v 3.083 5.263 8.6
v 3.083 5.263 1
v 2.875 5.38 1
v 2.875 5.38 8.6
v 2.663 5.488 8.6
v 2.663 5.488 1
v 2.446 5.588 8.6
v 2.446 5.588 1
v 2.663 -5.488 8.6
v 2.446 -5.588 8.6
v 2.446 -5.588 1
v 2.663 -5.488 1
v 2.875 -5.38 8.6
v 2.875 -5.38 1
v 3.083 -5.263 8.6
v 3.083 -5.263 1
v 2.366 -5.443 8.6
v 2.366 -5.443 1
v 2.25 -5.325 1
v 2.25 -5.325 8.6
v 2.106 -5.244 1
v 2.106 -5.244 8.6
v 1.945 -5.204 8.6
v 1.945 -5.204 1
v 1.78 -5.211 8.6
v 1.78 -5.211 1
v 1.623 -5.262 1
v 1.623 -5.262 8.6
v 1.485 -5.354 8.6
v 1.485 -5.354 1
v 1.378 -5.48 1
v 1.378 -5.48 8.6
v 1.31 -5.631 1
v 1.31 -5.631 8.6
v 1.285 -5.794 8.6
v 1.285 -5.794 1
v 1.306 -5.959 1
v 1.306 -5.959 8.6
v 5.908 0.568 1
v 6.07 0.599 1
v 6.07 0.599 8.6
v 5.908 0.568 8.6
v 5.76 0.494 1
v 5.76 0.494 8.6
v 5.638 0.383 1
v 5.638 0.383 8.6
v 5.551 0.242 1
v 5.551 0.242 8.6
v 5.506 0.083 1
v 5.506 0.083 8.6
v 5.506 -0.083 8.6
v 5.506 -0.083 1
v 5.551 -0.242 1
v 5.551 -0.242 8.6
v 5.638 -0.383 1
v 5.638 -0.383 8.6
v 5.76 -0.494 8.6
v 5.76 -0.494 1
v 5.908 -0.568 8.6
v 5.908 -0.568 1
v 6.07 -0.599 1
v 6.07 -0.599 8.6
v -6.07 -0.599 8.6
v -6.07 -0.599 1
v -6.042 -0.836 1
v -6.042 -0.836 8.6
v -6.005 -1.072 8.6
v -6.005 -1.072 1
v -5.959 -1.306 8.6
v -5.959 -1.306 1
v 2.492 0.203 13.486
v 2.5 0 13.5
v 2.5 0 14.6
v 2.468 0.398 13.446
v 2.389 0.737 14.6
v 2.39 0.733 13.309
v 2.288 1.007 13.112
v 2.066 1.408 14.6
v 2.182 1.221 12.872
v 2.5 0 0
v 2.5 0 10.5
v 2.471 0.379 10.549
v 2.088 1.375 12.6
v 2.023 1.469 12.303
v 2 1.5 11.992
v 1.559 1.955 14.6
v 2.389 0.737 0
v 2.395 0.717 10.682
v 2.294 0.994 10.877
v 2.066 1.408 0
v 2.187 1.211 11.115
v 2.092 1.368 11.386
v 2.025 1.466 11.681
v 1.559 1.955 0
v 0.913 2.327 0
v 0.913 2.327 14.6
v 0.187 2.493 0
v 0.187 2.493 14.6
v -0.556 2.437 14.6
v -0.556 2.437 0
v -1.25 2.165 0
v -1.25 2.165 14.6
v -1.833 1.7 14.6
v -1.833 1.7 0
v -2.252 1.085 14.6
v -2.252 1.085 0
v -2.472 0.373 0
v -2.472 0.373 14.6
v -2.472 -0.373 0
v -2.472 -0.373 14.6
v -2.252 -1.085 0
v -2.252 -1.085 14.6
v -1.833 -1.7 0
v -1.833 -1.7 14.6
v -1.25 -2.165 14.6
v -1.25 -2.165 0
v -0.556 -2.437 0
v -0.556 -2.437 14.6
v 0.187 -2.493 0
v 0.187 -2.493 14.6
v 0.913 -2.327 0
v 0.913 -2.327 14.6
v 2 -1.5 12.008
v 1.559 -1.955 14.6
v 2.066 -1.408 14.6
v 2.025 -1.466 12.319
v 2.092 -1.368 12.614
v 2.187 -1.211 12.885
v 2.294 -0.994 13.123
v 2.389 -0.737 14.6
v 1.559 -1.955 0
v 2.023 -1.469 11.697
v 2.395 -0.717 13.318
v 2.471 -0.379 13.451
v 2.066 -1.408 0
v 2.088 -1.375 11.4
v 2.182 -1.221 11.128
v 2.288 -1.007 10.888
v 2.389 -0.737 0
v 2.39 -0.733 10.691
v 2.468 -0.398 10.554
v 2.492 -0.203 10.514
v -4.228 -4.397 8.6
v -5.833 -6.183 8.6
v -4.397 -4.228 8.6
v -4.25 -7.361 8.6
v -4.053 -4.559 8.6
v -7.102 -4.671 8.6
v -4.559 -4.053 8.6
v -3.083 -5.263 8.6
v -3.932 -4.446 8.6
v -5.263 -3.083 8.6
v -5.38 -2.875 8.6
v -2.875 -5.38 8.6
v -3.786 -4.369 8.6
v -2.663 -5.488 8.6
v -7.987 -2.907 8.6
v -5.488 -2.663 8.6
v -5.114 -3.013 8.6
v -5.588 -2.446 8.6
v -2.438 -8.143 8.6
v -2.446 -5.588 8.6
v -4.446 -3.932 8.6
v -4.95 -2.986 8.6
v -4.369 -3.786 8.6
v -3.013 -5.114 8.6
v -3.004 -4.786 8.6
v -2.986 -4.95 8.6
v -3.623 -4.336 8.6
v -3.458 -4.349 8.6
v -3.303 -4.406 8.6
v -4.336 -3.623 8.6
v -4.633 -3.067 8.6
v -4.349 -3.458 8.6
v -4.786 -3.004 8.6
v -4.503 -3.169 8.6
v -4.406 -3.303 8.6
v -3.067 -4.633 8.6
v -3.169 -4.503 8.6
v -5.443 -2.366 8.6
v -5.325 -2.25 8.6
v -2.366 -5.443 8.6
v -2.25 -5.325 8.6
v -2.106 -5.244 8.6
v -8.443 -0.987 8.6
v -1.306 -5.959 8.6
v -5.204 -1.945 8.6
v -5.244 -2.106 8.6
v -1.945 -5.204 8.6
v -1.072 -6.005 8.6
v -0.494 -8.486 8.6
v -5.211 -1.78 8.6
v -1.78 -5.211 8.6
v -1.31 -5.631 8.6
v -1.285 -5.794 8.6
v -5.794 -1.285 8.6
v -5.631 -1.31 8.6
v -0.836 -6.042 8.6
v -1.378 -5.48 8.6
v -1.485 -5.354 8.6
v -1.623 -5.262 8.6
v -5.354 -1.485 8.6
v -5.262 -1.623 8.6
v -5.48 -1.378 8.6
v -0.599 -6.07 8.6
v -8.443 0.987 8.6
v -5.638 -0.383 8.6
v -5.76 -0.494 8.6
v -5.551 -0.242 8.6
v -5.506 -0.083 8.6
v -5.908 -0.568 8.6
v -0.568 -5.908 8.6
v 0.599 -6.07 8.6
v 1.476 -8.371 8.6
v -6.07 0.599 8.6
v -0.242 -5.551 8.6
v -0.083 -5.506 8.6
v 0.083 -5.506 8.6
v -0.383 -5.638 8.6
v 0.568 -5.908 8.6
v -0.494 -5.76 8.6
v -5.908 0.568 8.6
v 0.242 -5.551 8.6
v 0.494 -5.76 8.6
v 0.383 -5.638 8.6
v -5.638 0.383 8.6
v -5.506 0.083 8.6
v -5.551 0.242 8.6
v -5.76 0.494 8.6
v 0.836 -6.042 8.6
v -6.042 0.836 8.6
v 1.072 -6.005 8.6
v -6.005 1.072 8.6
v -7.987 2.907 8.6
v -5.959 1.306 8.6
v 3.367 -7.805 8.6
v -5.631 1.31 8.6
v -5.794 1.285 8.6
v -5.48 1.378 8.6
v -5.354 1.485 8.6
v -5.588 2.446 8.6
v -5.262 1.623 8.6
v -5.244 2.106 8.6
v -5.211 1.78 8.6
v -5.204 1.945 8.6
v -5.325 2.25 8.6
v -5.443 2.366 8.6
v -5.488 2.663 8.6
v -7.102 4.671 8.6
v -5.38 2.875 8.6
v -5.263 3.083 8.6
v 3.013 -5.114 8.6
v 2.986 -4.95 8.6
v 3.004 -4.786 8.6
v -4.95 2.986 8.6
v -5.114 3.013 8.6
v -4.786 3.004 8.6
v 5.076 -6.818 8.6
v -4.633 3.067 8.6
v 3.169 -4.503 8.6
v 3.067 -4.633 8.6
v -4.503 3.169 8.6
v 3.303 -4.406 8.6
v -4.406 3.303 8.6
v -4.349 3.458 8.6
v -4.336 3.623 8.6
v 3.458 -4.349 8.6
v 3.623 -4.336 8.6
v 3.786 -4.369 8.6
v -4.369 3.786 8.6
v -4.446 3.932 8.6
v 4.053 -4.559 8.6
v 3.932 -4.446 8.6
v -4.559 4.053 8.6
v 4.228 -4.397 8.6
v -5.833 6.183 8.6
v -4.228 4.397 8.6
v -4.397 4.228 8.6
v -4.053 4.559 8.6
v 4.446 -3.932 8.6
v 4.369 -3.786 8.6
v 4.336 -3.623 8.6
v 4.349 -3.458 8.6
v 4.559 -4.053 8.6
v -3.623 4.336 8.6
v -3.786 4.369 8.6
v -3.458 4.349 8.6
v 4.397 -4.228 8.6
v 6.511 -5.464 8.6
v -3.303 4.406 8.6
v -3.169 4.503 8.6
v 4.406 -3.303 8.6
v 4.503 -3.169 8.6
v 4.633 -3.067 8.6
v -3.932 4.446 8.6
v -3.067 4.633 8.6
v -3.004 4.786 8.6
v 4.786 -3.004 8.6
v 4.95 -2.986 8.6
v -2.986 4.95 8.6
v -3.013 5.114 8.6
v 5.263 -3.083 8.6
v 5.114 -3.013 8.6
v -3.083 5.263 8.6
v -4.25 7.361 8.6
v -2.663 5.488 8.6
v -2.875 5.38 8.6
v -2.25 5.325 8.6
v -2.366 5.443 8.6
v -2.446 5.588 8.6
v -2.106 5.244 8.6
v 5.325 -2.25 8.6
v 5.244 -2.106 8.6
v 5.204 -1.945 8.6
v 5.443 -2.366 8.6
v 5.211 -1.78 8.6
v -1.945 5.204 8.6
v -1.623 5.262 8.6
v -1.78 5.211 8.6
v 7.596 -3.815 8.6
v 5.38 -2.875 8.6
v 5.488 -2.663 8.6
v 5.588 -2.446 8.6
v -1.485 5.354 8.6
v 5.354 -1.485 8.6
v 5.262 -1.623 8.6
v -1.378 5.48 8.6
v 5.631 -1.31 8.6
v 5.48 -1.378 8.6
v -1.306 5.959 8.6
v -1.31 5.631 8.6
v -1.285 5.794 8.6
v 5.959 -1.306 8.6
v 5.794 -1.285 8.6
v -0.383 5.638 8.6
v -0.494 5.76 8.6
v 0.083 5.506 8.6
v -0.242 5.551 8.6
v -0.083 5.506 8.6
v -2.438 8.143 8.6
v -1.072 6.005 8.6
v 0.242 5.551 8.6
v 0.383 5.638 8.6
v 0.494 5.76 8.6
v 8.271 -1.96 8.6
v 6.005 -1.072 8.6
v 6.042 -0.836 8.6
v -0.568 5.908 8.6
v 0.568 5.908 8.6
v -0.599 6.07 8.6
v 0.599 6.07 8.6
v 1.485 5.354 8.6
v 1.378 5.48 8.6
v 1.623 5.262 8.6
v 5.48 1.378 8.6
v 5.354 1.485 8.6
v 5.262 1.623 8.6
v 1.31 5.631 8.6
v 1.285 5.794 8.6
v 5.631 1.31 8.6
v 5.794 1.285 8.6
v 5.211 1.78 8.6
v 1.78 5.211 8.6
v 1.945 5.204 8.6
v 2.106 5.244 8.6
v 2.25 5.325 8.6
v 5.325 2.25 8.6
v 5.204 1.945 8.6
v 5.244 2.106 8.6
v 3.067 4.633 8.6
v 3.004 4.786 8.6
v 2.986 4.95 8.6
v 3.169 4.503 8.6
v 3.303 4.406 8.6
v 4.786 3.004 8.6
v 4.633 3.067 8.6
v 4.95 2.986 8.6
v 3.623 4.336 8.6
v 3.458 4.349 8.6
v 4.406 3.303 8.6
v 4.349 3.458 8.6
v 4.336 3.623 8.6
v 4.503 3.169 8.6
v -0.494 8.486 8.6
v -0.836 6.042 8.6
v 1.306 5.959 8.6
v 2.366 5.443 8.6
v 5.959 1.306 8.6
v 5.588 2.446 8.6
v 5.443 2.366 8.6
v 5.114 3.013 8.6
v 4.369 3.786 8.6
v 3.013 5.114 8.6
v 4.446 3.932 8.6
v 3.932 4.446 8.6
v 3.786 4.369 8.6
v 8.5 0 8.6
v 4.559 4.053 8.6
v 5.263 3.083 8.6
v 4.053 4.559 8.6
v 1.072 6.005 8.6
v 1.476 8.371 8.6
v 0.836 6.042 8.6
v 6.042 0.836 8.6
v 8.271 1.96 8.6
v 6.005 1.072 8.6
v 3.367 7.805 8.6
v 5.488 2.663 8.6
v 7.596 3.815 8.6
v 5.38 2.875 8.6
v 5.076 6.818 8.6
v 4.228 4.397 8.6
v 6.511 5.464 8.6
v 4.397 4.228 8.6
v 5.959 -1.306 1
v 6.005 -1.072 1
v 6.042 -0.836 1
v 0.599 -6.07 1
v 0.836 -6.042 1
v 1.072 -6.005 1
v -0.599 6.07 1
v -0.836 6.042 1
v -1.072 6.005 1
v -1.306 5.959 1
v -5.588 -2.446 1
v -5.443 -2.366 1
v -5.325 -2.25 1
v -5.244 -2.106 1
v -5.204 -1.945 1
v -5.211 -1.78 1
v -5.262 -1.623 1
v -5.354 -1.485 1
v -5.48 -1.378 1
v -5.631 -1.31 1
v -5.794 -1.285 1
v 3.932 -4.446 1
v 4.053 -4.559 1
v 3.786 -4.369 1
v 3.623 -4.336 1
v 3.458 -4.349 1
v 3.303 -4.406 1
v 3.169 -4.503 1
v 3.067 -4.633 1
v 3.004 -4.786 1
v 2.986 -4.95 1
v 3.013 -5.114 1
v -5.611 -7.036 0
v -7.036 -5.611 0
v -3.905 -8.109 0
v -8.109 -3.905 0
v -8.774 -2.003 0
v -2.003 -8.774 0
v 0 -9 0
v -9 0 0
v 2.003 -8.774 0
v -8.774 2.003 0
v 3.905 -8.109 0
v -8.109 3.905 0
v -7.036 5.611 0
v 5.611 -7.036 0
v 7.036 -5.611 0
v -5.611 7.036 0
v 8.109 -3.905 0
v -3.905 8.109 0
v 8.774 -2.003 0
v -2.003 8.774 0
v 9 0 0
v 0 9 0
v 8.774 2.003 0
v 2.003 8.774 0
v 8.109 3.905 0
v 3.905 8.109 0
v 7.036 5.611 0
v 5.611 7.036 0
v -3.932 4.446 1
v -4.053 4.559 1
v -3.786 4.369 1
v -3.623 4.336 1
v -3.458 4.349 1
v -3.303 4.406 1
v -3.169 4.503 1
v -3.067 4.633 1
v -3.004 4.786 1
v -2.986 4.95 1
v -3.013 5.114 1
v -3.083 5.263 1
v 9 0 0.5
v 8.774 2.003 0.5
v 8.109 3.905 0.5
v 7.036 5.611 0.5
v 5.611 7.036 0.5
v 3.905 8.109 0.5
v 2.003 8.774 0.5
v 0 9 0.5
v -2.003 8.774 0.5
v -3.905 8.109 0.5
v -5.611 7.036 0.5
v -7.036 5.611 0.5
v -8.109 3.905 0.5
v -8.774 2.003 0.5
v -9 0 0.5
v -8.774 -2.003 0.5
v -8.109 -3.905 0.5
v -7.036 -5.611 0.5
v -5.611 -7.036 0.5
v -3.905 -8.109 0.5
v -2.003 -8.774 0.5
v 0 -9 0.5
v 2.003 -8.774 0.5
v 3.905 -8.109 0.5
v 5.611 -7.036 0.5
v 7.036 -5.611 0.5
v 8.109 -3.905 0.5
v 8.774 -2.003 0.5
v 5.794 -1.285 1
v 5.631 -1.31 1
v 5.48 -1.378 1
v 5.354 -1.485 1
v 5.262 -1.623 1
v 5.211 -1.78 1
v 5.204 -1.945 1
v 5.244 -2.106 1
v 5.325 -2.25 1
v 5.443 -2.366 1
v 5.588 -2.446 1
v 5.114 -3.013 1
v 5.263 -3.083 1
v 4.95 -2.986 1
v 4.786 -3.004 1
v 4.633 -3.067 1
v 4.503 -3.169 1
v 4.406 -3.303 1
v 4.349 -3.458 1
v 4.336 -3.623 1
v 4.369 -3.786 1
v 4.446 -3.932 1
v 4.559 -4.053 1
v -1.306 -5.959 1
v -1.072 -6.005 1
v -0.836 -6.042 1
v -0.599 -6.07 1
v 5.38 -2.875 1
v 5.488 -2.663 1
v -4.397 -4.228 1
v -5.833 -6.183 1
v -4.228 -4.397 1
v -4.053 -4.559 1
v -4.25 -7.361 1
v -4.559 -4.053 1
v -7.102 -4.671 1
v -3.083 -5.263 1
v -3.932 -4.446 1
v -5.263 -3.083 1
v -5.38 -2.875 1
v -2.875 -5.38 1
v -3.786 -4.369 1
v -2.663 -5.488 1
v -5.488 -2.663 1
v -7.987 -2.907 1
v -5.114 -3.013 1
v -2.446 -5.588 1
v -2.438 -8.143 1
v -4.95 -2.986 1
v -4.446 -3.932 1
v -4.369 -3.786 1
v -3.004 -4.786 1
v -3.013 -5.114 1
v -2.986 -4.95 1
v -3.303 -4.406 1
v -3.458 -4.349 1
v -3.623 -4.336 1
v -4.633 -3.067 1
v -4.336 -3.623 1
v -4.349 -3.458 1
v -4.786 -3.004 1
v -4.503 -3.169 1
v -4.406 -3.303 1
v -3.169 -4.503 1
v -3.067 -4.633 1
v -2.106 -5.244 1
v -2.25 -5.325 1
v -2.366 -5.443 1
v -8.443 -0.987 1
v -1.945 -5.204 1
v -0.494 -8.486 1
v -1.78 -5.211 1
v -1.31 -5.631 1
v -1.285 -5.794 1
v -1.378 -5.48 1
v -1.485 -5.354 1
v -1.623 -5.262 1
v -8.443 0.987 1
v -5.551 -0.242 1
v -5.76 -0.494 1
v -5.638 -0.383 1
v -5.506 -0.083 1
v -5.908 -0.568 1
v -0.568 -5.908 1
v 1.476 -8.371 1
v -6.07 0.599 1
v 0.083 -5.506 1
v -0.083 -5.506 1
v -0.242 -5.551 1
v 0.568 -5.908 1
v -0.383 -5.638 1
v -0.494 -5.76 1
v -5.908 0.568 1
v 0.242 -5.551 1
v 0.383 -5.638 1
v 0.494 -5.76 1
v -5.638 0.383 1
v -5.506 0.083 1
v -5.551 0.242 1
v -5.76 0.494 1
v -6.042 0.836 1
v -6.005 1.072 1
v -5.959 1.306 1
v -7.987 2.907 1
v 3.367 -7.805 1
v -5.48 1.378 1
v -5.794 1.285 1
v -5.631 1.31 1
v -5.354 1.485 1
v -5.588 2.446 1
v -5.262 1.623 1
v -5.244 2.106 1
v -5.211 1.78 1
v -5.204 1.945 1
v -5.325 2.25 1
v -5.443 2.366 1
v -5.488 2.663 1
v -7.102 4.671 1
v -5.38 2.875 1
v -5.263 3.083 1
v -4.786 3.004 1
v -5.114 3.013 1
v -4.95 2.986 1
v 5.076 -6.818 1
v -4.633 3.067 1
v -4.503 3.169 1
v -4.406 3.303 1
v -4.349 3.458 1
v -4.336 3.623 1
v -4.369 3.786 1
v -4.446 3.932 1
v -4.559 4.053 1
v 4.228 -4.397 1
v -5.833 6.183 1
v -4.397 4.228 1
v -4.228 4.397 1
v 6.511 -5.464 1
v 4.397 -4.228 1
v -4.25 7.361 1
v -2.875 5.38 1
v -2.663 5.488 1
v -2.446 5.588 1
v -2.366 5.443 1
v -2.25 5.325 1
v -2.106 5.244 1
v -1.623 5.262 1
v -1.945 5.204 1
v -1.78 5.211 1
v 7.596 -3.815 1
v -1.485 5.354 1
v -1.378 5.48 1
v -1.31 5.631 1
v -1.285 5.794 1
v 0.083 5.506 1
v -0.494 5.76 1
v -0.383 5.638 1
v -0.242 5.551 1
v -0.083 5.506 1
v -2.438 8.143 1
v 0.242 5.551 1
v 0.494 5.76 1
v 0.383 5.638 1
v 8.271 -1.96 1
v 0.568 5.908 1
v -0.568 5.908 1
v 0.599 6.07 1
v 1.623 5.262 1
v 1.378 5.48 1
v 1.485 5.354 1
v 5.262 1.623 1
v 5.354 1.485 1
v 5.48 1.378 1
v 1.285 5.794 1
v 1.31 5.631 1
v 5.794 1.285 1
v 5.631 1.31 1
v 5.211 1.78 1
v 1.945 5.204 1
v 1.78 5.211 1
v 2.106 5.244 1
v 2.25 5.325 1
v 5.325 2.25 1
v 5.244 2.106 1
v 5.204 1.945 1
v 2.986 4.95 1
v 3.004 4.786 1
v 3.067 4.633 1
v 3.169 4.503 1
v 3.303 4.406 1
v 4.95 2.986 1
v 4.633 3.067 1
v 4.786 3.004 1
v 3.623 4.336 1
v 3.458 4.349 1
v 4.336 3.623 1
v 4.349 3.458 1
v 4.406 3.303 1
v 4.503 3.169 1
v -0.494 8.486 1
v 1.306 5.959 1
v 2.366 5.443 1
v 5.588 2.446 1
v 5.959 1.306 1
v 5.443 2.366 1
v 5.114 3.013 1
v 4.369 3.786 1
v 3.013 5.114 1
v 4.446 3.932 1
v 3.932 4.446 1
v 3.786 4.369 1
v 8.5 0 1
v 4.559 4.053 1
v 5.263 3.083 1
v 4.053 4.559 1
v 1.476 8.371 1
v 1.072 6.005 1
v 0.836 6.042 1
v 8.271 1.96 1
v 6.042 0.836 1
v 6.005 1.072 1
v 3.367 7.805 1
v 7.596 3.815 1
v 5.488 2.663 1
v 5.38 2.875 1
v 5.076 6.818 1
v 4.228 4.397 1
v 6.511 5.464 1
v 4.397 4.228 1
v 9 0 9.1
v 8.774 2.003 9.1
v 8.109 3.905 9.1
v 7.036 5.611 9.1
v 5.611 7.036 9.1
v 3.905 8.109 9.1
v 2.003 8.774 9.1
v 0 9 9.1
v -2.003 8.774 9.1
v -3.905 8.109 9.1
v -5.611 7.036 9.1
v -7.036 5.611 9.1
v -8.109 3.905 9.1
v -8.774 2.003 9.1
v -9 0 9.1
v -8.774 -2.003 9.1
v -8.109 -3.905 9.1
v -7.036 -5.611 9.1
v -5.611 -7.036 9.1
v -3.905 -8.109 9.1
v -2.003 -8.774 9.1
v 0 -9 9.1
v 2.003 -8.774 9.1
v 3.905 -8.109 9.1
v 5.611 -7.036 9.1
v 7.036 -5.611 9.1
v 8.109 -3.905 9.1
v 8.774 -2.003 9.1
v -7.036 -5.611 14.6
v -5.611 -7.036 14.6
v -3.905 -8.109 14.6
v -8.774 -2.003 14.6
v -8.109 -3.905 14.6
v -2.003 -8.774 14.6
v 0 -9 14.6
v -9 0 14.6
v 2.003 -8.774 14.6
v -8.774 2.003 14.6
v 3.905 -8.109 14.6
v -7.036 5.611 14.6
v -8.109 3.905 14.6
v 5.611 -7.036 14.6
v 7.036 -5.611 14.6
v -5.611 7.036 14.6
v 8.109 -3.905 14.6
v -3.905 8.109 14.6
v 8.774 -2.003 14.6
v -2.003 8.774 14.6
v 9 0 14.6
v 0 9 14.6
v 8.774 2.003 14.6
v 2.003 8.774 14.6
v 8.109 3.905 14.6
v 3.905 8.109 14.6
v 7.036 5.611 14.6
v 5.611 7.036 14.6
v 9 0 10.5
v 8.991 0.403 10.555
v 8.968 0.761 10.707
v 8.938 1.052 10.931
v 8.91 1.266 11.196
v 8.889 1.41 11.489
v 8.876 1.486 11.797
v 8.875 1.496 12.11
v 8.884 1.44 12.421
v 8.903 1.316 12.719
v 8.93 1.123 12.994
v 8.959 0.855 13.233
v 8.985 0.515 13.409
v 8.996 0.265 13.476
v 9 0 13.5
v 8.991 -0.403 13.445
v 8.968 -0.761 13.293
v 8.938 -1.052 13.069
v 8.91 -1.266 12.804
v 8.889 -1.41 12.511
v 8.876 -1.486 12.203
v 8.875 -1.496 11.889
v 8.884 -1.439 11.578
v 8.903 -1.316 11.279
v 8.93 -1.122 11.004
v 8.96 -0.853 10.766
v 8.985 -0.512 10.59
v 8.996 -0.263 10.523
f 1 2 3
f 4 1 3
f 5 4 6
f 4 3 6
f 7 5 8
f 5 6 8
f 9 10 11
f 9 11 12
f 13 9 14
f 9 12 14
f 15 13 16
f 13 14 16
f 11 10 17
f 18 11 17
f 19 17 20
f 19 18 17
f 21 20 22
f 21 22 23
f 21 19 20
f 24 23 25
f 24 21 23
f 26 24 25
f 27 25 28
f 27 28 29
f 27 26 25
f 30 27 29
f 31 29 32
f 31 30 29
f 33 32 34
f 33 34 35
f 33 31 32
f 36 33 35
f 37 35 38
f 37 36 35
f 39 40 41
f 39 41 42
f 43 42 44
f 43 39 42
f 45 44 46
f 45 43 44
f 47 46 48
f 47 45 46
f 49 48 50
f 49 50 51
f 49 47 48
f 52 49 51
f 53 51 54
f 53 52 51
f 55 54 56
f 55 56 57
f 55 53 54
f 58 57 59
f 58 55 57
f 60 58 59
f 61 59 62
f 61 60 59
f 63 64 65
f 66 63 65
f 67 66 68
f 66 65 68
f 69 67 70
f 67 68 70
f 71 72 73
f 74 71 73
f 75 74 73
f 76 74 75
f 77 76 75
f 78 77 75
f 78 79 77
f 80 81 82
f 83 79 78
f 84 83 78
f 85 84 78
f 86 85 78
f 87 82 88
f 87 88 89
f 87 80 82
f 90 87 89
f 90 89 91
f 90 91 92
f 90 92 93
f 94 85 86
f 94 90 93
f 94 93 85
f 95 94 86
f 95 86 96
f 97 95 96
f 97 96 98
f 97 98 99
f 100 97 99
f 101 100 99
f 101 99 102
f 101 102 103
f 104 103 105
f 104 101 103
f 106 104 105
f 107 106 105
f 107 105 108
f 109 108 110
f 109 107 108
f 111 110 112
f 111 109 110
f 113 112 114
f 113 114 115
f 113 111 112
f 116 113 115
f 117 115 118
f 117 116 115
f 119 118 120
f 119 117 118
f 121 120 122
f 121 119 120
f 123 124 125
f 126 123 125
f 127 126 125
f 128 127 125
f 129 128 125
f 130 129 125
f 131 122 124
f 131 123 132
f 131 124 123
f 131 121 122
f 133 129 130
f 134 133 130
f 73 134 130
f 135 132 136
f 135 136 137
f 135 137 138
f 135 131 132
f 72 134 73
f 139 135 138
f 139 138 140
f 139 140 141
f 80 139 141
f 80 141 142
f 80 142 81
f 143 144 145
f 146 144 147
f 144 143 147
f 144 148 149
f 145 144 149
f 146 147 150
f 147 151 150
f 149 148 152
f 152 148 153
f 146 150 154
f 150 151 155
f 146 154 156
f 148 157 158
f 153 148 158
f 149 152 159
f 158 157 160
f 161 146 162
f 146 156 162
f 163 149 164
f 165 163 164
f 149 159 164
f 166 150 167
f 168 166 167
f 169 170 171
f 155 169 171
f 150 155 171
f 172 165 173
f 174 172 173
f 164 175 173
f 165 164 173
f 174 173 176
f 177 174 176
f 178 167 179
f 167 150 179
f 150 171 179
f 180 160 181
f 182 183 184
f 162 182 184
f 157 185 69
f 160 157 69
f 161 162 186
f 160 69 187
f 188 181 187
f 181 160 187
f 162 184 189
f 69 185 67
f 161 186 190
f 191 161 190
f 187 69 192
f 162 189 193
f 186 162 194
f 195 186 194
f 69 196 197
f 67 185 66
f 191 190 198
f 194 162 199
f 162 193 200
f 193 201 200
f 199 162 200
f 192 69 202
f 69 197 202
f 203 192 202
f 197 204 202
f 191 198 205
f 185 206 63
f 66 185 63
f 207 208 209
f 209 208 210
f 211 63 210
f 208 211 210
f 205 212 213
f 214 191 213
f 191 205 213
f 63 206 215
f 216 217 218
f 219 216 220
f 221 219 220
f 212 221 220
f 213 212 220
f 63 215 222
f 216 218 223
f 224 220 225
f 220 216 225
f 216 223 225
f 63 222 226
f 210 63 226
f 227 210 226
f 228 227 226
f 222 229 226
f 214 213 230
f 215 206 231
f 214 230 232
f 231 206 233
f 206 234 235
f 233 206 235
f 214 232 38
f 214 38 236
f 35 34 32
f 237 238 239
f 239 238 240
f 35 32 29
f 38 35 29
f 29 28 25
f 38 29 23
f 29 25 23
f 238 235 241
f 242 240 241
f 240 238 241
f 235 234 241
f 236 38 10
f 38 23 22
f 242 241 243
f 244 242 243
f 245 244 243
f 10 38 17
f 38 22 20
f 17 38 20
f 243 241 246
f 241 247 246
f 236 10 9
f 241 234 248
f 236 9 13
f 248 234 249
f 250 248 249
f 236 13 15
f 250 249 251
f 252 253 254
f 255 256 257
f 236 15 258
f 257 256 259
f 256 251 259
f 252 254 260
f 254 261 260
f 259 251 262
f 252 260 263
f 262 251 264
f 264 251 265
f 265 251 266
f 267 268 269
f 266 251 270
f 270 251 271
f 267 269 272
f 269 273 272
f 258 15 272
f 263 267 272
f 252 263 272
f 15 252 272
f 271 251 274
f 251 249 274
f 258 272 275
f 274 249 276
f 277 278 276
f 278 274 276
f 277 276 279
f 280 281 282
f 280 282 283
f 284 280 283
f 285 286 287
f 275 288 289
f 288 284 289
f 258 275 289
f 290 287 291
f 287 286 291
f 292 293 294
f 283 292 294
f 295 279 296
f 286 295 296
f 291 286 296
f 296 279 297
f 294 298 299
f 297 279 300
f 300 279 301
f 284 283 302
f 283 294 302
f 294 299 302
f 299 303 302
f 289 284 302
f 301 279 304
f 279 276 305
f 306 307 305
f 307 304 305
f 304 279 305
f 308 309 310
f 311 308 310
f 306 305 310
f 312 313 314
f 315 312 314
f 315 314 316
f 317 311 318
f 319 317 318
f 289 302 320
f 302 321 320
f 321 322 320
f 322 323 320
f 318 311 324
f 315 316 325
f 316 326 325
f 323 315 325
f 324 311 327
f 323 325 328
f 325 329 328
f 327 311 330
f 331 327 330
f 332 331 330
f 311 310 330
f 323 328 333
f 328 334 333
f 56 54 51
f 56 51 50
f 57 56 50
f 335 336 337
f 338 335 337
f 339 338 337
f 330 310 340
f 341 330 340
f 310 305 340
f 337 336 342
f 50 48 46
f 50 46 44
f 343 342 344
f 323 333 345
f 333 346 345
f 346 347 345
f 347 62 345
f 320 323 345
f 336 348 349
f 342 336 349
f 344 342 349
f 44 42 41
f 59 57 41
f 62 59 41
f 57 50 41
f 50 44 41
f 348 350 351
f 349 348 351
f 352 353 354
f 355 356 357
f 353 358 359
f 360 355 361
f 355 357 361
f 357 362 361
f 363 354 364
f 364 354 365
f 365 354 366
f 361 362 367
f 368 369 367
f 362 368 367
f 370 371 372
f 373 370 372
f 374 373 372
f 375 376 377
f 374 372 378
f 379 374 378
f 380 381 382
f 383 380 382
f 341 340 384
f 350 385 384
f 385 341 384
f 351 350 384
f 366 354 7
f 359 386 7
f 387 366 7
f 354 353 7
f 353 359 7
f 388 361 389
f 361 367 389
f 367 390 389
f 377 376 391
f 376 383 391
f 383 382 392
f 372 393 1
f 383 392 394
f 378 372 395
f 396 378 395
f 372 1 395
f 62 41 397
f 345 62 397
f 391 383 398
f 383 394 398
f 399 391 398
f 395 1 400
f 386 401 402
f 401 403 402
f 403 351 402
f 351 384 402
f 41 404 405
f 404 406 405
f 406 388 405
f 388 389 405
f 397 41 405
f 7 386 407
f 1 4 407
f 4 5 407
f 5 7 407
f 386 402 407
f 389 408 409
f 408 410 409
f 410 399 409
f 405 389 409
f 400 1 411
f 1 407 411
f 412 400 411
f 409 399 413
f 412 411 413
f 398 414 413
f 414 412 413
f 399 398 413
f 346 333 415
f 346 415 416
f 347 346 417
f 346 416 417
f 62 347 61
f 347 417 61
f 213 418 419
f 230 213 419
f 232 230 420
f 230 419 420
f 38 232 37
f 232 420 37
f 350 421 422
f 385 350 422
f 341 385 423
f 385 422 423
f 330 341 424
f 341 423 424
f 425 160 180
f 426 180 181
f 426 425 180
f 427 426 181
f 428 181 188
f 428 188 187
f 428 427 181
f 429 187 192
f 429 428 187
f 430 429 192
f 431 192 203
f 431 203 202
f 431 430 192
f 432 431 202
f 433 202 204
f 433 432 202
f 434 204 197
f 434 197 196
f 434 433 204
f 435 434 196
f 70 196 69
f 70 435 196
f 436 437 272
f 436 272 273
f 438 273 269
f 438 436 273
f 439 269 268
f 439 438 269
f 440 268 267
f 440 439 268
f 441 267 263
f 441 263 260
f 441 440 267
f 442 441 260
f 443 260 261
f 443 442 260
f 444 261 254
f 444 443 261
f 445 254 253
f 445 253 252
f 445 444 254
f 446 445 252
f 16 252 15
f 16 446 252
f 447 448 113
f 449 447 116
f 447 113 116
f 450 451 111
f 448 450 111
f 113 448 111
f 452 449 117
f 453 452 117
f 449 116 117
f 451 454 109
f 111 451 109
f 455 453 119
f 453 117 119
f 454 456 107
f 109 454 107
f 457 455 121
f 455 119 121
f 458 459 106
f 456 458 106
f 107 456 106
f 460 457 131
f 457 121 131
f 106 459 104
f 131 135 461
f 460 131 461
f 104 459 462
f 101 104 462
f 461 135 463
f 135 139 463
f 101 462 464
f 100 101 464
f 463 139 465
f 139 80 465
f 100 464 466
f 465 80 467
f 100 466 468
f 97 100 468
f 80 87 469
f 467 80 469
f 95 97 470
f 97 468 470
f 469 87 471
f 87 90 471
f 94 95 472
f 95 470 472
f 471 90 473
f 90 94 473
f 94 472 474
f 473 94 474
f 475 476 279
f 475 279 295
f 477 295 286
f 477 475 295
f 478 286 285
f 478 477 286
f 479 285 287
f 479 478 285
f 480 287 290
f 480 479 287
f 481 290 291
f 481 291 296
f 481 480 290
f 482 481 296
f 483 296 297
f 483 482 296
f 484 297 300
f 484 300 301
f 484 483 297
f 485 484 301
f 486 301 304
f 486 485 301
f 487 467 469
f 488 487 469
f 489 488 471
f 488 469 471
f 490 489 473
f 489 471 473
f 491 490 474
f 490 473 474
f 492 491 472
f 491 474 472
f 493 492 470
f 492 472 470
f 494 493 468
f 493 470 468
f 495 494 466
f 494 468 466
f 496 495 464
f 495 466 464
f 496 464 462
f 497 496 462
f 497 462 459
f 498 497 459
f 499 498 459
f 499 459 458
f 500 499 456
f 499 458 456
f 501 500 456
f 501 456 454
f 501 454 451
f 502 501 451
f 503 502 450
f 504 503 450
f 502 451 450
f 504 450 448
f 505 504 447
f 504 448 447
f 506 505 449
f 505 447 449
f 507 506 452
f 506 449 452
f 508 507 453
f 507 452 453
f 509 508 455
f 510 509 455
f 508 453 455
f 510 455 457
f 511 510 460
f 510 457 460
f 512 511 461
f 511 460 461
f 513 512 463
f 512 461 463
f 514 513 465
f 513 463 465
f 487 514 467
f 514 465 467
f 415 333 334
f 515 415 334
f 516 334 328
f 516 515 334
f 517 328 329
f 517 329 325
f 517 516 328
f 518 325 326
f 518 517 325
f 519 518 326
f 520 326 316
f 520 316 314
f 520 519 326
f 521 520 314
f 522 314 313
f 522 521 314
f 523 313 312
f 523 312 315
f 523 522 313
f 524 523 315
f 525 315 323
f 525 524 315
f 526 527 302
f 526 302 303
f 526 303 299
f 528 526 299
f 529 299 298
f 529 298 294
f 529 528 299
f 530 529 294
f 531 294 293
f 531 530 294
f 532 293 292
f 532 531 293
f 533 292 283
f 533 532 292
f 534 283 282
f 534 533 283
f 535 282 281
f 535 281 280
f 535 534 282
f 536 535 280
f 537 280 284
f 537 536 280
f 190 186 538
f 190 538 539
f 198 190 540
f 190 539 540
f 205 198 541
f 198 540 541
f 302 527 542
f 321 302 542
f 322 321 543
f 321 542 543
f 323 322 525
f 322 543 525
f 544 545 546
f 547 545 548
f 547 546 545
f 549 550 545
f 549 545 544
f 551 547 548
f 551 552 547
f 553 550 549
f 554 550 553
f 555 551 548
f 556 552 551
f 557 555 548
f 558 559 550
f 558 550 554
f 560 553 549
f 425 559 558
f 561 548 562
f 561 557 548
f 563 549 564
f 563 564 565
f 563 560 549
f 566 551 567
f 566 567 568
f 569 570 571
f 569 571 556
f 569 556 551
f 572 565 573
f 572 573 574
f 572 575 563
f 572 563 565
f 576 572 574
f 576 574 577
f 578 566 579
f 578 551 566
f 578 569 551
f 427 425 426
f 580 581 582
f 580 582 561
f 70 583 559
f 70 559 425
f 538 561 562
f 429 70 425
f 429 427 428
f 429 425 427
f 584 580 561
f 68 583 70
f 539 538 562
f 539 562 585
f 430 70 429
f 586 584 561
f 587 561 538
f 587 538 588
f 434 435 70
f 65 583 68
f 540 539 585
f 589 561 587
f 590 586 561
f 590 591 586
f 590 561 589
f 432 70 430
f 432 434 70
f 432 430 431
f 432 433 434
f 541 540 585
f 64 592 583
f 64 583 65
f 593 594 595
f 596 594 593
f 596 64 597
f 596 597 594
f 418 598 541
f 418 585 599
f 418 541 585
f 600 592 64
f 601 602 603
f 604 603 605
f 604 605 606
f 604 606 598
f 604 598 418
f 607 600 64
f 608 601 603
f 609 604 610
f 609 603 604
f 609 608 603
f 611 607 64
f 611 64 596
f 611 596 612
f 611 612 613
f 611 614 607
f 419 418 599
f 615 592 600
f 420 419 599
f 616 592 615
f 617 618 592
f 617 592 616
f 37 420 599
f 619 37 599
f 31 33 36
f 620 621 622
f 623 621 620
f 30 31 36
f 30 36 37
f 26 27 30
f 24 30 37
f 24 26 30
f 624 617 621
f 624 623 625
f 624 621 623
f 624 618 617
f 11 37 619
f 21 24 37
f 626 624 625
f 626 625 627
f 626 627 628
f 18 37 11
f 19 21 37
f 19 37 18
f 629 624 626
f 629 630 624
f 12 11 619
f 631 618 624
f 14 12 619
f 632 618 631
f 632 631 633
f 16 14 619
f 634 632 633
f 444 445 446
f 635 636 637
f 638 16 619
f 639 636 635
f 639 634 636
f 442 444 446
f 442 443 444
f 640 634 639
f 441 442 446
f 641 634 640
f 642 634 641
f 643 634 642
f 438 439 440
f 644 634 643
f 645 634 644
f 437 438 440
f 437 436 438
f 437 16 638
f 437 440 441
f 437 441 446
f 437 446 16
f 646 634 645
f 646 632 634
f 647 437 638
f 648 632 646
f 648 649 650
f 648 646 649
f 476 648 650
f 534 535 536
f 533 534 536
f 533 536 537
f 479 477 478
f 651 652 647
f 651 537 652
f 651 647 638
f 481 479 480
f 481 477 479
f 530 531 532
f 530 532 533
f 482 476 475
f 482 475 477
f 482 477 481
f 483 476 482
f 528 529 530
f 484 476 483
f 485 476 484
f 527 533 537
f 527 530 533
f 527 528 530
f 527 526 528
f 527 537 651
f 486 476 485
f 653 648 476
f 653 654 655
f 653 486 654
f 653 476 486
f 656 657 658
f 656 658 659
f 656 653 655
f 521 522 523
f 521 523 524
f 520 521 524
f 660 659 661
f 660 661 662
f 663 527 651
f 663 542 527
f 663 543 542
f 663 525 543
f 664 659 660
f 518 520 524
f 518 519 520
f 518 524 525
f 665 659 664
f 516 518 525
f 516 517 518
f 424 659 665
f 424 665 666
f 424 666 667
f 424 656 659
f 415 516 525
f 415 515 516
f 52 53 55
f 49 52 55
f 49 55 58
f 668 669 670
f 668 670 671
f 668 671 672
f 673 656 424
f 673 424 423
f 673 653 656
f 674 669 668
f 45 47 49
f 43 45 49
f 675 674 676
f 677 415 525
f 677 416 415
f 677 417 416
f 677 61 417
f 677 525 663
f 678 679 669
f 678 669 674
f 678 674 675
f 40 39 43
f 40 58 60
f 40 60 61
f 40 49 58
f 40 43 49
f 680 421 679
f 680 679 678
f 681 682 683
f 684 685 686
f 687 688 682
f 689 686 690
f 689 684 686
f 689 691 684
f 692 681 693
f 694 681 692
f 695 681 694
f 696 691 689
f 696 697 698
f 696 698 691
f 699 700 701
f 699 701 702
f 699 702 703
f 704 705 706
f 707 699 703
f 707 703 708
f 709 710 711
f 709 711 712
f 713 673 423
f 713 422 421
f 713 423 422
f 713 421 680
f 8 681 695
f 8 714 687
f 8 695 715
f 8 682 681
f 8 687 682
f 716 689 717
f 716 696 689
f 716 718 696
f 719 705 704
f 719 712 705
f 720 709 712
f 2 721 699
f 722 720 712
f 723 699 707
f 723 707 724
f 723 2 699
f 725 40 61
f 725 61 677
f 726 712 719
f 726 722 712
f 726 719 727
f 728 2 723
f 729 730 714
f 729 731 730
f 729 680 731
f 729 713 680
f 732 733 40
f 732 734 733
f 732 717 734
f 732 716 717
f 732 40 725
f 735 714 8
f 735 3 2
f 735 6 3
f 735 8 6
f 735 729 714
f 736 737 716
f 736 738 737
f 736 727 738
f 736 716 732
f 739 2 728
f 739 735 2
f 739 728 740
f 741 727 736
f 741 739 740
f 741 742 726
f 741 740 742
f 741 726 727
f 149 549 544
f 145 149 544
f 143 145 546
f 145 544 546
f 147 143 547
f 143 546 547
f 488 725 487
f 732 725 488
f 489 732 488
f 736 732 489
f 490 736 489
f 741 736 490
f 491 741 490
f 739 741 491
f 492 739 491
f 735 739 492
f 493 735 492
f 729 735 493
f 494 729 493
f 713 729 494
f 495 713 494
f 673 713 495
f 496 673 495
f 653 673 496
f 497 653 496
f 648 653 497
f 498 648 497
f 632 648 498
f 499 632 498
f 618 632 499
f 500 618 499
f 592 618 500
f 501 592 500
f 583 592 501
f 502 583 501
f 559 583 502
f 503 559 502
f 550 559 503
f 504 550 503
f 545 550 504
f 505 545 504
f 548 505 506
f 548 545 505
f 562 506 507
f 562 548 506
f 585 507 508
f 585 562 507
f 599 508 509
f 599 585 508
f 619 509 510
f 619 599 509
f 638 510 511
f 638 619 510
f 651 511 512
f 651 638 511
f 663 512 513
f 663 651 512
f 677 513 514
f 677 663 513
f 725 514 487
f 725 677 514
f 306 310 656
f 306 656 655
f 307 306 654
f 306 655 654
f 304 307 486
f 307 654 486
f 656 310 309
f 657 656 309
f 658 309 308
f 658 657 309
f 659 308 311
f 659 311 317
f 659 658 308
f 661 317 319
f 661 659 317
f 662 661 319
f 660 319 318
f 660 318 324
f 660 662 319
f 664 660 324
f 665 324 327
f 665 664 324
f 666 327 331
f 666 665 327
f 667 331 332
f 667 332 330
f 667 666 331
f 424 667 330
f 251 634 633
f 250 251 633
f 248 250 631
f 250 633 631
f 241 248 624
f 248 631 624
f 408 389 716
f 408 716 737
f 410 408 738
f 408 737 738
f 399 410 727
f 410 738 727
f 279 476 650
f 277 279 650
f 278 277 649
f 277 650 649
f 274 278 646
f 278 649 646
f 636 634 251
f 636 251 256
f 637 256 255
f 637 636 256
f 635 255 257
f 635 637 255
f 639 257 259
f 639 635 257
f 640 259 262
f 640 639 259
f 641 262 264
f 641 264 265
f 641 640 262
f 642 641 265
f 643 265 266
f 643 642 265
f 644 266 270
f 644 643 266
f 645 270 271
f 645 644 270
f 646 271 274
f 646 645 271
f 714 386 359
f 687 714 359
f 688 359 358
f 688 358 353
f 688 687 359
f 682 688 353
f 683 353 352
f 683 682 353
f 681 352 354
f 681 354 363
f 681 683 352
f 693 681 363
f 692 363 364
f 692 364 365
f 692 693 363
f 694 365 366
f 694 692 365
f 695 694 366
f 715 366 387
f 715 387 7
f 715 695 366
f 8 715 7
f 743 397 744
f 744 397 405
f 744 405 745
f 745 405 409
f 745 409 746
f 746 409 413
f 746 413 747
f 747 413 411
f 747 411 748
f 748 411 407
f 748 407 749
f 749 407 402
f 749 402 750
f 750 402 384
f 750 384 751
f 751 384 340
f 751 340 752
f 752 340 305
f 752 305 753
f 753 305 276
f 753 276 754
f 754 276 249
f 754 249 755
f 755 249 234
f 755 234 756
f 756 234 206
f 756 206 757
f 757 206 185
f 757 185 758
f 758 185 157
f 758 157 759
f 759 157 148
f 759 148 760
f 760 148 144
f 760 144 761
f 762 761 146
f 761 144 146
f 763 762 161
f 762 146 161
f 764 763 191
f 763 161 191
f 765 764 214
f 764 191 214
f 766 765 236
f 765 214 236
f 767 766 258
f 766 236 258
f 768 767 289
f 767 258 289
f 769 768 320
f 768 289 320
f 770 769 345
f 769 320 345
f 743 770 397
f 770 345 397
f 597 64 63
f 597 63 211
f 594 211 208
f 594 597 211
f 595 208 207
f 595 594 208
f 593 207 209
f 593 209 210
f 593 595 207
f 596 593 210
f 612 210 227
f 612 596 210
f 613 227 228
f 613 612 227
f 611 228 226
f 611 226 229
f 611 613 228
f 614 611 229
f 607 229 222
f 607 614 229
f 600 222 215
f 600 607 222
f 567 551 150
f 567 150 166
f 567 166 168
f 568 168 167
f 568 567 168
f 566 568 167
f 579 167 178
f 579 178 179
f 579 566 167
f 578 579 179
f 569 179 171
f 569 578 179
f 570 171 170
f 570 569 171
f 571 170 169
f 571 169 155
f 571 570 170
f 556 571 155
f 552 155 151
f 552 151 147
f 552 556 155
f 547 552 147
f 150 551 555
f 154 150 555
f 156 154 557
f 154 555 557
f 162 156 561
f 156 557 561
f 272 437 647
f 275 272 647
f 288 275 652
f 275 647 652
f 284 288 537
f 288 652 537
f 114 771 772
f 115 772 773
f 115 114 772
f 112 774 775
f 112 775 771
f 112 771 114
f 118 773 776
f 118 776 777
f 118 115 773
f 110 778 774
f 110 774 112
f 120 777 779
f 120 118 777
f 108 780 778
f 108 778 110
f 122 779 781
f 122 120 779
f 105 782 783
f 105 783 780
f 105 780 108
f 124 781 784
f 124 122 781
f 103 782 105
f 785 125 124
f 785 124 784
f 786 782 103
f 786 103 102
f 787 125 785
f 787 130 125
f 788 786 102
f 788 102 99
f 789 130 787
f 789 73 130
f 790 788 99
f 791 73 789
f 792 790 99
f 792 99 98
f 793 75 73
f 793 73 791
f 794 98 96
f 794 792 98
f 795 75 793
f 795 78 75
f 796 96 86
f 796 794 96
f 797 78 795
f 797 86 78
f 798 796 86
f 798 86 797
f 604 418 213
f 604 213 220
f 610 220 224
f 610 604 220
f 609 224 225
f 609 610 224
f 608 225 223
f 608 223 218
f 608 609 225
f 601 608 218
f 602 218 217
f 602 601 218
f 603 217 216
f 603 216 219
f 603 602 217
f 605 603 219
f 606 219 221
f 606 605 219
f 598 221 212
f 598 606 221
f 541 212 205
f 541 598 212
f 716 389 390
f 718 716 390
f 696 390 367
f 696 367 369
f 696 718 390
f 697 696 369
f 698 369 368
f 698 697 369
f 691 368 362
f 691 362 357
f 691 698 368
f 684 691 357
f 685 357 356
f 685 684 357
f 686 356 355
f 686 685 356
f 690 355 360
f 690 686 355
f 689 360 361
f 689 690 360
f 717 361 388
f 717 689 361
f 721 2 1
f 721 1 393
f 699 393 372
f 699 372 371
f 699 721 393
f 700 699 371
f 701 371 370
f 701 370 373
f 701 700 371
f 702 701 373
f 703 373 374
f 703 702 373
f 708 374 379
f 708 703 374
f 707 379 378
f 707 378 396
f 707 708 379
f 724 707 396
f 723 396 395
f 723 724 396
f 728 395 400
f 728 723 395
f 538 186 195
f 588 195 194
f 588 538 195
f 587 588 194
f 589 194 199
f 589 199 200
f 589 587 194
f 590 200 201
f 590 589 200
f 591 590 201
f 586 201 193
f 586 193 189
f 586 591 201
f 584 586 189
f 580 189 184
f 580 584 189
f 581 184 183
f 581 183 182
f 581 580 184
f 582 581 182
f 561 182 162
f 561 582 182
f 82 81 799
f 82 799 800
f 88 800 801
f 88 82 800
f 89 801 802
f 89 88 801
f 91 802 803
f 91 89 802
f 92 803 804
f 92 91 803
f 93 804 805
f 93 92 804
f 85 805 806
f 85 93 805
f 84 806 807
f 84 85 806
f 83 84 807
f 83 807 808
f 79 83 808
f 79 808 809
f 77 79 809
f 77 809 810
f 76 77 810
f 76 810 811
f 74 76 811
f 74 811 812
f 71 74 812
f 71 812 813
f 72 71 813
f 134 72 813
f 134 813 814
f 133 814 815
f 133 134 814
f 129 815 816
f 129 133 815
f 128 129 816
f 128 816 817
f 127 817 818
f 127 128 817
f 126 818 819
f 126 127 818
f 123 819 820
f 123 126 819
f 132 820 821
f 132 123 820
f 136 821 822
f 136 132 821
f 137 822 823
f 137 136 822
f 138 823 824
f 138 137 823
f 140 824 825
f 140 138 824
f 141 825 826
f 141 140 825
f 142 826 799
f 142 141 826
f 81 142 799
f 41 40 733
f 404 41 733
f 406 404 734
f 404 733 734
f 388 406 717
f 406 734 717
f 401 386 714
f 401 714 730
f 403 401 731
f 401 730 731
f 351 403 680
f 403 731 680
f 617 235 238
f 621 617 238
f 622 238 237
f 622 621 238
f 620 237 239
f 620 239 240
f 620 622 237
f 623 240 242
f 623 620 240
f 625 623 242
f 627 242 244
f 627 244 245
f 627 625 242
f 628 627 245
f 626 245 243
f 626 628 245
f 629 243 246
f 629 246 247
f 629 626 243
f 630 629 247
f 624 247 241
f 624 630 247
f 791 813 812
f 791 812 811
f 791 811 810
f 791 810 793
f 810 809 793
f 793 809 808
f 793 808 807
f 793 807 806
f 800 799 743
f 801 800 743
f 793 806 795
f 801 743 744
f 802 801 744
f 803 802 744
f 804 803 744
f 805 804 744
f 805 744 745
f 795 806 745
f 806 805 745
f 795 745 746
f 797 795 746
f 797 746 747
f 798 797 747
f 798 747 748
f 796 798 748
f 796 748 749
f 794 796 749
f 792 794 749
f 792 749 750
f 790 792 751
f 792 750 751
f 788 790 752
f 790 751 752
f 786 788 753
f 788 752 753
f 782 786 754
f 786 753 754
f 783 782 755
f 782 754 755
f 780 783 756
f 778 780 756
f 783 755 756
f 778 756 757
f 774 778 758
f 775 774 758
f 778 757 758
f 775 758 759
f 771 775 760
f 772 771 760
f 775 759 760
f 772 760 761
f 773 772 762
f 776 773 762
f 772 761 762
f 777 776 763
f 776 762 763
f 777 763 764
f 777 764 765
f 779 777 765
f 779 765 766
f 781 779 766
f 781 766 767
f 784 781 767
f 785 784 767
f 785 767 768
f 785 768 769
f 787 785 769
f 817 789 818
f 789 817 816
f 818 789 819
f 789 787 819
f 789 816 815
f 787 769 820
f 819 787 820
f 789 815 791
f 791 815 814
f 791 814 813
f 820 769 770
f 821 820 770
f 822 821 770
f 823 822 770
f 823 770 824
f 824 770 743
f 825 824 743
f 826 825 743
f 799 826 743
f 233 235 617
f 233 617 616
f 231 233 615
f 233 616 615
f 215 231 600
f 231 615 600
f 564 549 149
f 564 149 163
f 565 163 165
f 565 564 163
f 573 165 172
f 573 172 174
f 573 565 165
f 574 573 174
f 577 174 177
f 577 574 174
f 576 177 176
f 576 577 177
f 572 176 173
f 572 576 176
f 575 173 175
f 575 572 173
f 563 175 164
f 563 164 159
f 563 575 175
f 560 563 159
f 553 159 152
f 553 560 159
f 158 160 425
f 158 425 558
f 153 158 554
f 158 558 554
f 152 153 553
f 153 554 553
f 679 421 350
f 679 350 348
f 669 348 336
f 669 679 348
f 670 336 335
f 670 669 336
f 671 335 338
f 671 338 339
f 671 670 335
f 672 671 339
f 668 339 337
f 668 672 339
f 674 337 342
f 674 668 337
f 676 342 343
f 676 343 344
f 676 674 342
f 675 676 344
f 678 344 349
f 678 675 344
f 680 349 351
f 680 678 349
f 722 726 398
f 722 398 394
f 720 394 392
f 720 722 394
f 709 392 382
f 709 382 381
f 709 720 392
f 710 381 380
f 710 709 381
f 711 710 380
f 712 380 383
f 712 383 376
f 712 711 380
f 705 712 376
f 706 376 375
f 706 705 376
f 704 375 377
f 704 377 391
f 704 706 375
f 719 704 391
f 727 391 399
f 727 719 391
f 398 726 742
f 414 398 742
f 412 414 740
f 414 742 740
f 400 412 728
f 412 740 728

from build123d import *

# Parameters (mm, degrees)
CYLINDER014_R           = 1.5
CYLINDER014_DEPTH       = 9
CYLINDER014_PITCH_ANGLE = 90
CYLINDER013_R           = 2.5
CYLINDER013_DEPTH       = 14.6
CYLINDER011_R           = 9
CYLINDER011_DEPTH       = 1
CHAMFER007_SIZE         = 0.5
CYLINDER012_R           = 9
CYLINDER012_DEPTH       = 6
CHAMFER008_SIZE         = 0.5
CYLINDER009_R           = 0.6
CYLINDER009_DEPTH       = 7.6
ARRAY_COUNT             = 20
CYLINDER010_R           = 6.1
CYLINDER010_DEPTH       = 7.6


with BuildPart() as cilindro007:
    # Cylinder014 → Cylinder014 (new body)
    with BuildSketch(Plane.XY):
        Circle(CYLINDER014_R)
    extrude(amount=CYLINDER014_DEPTH)


with BuildPart() as cilindro007_1:
    # Cylinder014 pitch: moved
    add(cilindro007.part.rotate(Axis((0, 0, 0), (0, 1, 0)), CYLINDER014_PITCH_ANGLE))


with BuildPart() as cilindro007_2:
    # Cylinder014 placement: moved
    add(cilindro007_1.part.moved(Location((1, 0, 12))))


with BuildPart() as cilindro006:
    # Cylinder013 → Cylinder013 (new body)
    with BuildSketch(Plane.XY):
        Circle(CYLINDER013_R)
    extrude(amount=CYLINDER013_DEPTH)


with BuildPart() as chamfer007:
    # Cylinder011 → Cylinder011 (new body)
    with BuildSketch(Plane.XY):
        Circle(CYLINDER011_R)
    extrude(amount=CYLINDER011_DEPTH)

    # Chamfer007
    chamfer007_edges = [chamfer007.edges().sort_by_distance(p)[0] for p in [
        (-9, 0, 1),
    ]]
    chamfer(chamfer007_edges, length=CHAMFER007_SIZE)


with BuildPart() as chamfer008:
    # Cylinder012 → Cylinder012 (new body)
    with BuildSketch(Plane.XY.offset(8.6)):
        Circle(CYLINDER012_R)
    extrude(amount=CYLINDER012_DEPTH)

    # Chamfer008
    chamfer008_edges = [chamfer008.edges().sort_by_distance(p)[0] for p in [
        (-9, 0, 8.6),
    ]]
    chamfer(chamfer008_edges, length=CHAMFER008_SIZE)


with BuildPart() as array:
    # Cylinder009 → Cylinder009 (new body)
    with BuildSketch(Plane(origin=(6.1, 0, 0), x_dir=(1, 0, 0), z_dir=(0, 0, 1))):
        Circle(CYLINDER009_R)
    extrude(amount=CYLINDER009_DEPTH)

    # Array: Array ×20 about axis
    array_axis = Axis((0, 0, 0), (0, 0, 1))


with BuildPart() as array_1:
    add(array.part)
    for i in range(1, ARRAY_COUNT):
        add(array.part.rotate(array_axis, i * 360 / ARRAY_COUNT))


with BuildPart() as cut017:
    # Cylinder010 → Cylinder010 (new body)
    with BuildSketch(Plane.XY):
        Circle(CYLINDER010_R)
    extrude(amount=CYLINDER010_DEPTH)

    # Cut015: cut Array
    add(array_1.part, mode=Mode.SUBTRACT)


with BuildPart() as cut017_1:
    # Cut015 placement: moved
    add(cut017.part.moved(Location((0, 0, 1))))

    # Fusion006: union Chamfer007, Chamfer008
    add(chamfer007.part)
    add(chamfer008.part)

    # Cut016: cut Cilindro006
    add(cilindro006.part, mode=Mode.SUBTRACT)

    # Cut017: cut Cilindro007
    add(cilindro007_2.part, mode=Mode.SUBTRACT)


solid = cut017_1.part
